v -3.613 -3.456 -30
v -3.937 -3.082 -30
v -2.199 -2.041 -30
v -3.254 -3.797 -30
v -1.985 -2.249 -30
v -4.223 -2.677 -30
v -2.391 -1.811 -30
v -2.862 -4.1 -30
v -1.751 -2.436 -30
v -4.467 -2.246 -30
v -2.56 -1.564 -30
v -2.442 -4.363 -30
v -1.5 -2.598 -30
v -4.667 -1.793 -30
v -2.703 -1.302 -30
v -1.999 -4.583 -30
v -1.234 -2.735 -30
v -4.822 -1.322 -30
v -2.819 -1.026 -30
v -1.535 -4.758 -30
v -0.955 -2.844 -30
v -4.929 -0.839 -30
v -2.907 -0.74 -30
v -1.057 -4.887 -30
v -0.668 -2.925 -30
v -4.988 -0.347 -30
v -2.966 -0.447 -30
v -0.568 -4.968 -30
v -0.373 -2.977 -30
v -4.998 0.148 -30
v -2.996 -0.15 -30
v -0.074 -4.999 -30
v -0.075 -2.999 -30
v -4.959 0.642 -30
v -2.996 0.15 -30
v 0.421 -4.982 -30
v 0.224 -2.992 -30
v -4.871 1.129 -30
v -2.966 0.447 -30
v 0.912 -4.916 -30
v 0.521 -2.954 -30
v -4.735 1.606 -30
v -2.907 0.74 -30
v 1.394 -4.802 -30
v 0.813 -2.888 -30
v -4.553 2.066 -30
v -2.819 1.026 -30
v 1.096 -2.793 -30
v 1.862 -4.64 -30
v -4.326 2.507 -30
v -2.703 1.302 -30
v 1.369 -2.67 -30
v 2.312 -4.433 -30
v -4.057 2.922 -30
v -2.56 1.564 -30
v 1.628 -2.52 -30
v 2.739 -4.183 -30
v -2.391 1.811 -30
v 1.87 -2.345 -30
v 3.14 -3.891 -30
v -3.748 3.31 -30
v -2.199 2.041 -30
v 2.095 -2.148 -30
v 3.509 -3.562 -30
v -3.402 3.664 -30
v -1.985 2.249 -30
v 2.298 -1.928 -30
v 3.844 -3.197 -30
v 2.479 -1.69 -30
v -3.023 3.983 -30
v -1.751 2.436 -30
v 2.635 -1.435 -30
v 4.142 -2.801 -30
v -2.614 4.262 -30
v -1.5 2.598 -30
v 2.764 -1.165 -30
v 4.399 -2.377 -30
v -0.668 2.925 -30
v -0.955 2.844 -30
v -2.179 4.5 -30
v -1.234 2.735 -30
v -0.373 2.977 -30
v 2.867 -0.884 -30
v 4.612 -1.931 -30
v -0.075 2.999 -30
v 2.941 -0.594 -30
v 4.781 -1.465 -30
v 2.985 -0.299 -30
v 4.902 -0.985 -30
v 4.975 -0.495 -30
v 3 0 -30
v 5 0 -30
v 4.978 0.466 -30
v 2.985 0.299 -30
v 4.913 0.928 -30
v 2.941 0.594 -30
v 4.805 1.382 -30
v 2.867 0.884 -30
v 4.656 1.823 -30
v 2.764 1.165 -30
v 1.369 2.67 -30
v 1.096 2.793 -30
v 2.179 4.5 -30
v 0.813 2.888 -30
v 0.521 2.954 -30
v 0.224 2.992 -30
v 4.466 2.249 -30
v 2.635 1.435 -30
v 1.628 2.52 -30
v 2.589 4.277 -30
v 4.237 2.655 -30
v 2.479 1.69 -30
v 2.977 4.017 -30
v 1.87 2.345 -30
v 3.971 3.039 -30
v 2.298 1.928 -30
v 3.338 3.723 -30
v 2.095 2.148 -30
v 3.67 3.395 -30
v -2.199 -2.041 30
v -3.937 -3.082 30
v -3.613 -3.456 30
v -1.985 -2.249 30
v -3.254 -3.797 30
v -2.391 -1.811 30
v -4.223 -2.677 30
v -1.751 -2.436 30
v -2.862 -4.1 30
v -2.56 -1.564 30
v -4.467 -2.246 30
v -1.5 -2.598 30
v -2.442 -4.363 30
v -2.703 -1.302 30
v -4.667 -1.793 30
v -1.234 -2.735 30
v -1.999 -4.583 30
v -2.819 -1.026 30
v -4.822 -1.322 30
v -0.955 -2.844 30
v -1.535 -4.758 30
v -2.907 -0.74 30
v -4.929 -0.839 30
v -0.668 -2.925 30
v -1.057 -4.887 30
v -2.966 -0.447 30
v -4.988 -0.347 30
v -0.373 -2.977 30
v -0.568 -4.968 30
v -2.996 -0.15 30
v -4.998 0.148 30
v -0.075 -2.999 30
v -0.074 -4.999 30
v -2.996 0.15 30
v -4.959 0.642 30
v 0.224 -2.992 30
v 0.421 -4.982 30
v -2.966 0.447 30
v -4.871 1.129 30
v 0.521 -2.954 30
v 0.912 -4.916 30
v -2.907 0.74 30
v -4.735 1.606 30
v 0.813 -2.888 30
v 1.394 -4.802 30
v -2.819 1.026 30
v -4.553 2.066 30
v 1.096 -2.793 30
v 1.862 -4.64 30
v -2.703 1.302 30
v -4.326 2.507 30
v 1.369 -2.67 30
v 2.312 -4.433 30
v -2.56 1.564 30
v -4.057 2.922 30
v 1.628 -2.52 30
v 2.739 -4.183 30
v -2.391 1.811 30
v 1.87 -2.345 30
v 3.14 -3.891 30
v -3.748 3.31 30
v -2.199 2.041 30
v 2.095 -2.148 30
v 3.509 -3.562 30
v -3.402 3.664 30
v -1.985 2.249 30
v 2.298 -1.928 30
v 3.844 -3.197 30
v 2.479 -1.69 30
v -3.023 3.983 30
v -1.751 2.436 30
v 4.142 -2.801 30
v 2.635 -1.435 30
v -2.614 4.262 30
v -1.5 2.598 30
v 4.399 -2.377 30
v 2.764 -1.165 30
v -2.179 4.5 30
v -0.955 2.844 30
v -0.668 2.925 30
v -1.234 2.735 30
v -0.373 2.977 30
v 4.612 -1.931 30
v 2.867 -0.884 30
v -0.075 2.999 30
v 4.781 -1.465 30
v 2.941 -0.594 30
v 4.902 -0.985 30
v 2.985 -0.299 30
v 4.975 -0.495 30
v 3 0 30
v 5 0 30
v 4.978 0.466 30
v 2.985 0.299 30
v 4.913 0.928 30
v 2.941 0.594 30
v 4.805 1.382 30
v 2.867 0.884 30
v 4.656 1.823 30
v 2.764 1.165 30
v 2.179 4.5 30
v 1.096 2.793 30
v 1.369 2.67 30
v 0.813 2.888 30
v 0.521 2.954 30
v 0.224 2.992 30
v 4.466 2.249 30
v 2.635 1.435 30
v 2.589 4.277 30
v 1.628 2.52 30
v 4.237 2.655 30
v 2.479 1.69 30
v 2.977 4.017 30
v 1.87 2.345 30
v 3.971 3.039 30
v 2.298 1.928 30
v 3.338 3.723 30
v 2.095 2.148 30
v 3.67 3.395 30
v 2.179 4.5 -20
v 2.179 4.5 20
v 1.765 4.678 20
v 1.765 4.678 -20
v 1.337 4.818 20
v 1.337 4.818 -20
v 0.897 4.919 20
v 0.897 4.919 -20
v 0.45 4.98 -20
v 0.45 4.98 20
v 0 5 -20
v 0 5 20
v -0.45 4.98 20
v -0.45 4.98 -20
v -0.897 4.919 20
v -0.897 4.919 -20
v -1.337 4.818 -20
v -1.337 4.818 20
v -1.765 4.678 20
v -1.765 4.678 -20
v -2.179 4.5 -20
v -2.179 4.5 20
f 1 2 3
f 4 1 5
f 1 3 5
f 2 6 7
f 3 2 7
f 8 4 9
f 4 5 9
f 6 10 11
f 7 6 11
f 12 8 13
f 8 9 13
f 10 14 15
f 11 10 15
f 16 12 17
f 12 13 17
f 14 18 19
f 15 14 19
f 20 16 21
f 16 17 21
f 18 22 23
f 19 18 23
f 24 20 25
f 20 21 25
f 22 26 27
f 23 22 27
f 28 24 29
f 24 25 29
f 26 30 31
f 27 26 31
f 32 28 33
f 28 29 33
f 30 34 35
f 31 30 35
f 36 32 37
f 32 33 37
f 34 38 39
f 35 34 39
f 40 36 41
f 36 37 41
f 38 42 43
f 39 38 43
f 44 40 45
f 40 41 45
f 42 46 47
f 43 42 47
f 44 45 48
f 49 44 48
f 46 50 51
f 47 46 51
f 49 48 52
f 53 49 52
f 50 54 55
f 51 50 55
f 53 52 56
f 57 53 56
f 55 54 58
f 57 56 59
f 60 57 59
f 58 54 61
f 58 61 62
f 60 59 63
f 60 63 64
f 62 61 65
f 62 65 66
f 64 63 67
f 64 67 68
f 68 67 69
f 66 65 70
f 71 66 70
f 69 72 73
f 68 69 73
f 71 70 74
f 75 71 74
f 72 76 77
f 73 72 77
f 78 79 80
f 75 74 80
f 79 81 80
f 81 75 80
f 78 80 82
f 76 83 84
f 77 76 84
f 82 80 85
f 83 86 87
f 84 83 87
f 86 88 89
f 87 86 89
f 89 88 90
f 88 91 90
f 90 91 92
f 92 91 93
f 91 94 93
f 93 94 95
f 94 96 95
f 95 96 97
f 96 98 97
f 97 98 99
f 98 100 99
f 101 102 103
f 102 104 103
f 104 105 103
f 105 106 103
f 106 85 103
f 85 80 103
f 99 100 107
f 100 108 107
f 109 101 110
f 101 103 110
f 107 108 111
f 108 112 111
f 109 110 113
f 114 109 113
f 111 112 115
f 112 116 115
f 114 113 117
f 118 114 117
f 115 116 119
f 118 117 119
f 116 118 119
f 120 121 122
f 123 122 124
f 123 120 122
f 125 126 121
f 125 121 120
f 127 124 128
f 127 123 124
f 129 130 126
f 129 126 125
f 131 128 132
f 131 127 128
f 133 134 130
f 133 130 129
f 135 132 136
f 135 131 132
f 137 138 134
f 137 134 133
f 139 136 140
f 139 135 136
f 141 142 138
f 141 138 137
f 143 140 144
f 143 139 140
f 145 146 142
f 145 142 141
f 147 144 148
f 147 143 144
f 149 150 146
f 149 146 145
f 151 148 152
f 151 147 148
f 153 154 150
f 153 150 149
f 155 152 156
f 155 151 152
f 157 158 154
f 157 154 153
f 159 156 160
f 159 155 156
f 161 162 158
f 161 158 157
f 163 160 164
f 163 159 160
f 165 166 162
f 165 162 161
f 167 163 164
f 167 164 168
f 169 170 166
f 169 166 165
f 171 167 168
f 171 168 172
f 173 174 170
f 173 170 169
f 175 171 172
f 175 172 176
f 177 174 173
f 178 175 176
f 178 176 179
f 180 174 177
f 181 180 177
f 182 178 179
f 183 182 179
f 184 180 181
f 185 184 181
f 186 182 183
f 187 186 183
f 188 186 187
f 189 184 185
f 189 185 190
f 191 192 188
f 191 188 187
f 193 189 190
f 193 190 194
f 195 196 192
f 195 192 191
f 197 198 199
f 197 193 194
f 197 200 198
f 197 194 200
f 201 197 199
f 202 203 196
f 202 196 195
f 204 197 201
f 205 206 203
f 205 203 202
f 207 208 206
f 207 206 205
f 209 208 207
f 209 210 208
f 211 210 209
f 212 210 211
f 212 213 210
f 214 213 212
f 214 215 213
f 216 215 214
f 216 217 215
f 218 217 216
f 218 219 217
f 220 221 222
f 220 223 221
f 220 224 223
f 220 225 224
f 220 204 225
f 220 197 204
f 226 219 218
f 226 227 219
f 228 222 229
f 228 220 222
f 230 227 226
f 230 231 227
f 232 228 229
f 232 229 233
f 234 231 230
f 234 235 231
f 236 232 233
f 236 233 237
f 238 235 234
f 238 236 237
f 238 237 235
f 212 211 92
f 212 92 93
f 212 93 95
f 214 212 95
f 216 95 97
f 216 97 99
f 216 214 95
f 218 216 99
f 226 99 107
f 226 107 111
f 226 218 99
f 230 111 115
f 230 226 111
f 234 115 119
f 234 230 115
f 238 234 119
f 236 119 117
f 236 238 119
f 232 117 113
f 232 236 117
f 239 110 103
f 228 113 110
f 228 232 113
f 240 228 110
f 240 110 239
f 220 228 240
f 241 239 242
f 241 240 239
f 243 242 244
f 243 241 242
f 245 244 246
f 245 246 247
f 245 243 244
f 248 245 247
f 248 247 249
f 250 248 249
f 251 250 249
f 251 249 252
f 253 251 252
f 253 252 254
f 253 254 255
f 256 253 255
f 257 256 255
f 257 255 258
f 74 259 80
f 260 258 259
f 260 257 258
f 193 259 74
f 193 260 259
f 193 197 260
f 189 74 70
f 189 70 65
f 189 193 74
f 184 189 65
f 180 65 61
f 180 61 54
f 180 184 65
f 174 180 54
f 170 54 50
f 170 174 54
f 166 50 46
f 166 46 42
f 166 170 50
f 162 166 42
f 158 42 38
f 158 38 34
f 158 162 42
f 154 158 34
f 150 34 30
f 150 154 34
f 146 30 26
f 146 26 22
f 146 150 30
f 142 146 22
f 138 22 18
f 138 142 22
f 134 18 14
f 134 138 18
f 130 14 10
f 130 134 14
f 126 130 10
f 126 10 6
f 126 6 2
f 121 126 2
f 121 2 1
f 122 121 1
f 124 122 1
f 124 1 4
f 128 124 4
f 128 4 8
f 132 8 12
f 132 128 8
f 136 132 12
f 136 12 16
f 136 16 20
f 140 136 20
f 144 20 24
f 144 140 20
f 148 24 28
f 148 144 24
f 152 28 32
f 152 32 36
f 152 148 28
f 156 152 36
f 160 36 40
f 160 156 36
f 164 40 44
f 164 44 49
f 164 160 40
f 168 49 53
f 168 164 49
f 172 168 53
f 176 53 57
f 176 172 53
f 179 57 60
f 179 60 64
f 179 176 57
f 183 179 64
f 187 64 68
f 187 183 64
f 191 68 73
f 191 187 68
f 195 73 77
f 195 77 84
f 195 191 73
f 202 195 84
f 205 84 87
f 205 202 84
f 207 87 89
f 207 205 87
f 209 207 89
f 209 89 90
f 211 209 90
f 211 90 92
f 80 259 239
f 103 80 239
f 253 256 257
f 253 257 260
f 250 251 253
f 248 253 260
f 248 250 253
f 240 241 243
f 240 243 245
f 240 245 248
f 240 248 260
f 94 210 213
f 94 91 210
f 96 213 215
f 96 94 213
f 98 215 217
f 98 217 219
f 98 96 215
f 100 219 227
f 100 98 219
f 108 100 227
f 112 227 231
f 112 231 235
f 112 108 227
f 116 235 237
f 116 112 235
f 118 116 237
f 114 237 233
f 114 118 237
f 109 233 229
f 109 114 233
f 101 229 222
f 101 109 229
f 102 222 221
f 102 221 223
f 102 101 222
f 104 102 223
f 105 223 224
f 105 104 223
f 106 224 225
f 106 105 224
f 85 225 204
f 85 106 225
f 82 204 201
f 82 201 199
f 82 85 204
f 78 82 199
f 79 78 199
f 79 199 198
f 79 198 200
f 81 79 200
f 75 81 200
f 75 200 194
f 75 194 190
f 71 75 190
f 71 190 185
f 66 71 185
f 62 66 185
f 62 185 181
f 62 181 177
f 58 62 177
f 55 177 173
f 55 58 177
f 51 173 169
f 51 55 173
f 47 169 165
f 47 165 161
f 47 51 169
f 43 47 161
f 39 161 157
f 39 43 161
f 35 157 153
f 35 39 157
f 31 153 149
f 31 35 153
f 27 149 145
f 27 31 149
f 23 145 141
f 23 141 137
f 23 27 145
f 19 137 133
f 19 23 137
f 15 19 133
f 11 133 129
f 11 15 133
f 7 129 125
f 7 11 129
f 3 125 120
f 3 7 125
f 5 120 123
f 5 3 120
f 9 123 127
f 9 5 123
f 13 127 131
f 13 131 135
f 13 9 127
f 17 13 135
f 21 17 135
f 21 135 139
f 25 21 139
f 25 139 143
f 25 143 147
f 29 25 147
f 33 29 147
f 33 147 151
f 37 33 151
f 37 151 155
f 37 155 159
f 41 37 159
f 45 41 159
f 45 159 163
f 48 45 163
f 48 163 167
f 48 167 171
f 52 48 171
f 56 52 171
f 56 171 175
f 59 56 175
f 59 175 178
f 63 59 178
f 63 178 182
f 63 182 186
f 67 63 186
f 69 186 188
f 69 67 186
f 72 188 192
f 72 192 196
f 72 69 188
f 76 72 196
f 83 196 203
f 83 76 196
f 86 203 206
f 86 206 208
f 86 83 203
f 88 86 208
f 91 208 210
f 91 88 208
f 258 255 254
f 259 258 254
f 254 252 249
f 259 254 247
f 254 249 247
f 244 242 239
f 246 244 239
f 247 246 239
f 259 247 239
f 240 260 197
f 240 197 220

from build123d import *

# Parameters (mm, degrees)
SKETCH1_R           = 5
SKETCH1_R_2         = 3
BOSS_EXTRUDE1_DEPTH = 30
CUT_EXTRUDE1_START  = -10
CUT_EXTRUDE1_DEPTH  = 11


with BuildPart() as part:
    # Sketch1 → Boss-Extrude1 (new body, symmetric)
    with BuildSketch(Plane.XY):
        Circle(SKETCH1_R)
        Circle(SKETCH1_R_2, mode=Mode.SUBTRACT)
    extrude(amount=BOSS_EXTRUDE1_DEPTH, both=True)

    # Sketch4 → Cut-Extrude1 (cut)
    with BuildSketch(Plane.XY.offset(30).offset(CUT_EXTRUDE1_START)):
        with BuildLine():
            Line((-2.179449472, 4.5), (2.179449472, 4.5))
            ThreePointArc((2.179449472, 4.5), (0, 5), (-2.179449472, 4.5))
        make_face()
    cut_extrude1 = extrude(amount=CUT_EXTRUDE1_DEPTH, mode=Mode.SUBTRACT)

    # Mirror3: Cut-Extrude1 across plane
    add(cut_extrude1.mirror(Plane.XY), mode=Mode.SUBTRACT)


solid = part.part
